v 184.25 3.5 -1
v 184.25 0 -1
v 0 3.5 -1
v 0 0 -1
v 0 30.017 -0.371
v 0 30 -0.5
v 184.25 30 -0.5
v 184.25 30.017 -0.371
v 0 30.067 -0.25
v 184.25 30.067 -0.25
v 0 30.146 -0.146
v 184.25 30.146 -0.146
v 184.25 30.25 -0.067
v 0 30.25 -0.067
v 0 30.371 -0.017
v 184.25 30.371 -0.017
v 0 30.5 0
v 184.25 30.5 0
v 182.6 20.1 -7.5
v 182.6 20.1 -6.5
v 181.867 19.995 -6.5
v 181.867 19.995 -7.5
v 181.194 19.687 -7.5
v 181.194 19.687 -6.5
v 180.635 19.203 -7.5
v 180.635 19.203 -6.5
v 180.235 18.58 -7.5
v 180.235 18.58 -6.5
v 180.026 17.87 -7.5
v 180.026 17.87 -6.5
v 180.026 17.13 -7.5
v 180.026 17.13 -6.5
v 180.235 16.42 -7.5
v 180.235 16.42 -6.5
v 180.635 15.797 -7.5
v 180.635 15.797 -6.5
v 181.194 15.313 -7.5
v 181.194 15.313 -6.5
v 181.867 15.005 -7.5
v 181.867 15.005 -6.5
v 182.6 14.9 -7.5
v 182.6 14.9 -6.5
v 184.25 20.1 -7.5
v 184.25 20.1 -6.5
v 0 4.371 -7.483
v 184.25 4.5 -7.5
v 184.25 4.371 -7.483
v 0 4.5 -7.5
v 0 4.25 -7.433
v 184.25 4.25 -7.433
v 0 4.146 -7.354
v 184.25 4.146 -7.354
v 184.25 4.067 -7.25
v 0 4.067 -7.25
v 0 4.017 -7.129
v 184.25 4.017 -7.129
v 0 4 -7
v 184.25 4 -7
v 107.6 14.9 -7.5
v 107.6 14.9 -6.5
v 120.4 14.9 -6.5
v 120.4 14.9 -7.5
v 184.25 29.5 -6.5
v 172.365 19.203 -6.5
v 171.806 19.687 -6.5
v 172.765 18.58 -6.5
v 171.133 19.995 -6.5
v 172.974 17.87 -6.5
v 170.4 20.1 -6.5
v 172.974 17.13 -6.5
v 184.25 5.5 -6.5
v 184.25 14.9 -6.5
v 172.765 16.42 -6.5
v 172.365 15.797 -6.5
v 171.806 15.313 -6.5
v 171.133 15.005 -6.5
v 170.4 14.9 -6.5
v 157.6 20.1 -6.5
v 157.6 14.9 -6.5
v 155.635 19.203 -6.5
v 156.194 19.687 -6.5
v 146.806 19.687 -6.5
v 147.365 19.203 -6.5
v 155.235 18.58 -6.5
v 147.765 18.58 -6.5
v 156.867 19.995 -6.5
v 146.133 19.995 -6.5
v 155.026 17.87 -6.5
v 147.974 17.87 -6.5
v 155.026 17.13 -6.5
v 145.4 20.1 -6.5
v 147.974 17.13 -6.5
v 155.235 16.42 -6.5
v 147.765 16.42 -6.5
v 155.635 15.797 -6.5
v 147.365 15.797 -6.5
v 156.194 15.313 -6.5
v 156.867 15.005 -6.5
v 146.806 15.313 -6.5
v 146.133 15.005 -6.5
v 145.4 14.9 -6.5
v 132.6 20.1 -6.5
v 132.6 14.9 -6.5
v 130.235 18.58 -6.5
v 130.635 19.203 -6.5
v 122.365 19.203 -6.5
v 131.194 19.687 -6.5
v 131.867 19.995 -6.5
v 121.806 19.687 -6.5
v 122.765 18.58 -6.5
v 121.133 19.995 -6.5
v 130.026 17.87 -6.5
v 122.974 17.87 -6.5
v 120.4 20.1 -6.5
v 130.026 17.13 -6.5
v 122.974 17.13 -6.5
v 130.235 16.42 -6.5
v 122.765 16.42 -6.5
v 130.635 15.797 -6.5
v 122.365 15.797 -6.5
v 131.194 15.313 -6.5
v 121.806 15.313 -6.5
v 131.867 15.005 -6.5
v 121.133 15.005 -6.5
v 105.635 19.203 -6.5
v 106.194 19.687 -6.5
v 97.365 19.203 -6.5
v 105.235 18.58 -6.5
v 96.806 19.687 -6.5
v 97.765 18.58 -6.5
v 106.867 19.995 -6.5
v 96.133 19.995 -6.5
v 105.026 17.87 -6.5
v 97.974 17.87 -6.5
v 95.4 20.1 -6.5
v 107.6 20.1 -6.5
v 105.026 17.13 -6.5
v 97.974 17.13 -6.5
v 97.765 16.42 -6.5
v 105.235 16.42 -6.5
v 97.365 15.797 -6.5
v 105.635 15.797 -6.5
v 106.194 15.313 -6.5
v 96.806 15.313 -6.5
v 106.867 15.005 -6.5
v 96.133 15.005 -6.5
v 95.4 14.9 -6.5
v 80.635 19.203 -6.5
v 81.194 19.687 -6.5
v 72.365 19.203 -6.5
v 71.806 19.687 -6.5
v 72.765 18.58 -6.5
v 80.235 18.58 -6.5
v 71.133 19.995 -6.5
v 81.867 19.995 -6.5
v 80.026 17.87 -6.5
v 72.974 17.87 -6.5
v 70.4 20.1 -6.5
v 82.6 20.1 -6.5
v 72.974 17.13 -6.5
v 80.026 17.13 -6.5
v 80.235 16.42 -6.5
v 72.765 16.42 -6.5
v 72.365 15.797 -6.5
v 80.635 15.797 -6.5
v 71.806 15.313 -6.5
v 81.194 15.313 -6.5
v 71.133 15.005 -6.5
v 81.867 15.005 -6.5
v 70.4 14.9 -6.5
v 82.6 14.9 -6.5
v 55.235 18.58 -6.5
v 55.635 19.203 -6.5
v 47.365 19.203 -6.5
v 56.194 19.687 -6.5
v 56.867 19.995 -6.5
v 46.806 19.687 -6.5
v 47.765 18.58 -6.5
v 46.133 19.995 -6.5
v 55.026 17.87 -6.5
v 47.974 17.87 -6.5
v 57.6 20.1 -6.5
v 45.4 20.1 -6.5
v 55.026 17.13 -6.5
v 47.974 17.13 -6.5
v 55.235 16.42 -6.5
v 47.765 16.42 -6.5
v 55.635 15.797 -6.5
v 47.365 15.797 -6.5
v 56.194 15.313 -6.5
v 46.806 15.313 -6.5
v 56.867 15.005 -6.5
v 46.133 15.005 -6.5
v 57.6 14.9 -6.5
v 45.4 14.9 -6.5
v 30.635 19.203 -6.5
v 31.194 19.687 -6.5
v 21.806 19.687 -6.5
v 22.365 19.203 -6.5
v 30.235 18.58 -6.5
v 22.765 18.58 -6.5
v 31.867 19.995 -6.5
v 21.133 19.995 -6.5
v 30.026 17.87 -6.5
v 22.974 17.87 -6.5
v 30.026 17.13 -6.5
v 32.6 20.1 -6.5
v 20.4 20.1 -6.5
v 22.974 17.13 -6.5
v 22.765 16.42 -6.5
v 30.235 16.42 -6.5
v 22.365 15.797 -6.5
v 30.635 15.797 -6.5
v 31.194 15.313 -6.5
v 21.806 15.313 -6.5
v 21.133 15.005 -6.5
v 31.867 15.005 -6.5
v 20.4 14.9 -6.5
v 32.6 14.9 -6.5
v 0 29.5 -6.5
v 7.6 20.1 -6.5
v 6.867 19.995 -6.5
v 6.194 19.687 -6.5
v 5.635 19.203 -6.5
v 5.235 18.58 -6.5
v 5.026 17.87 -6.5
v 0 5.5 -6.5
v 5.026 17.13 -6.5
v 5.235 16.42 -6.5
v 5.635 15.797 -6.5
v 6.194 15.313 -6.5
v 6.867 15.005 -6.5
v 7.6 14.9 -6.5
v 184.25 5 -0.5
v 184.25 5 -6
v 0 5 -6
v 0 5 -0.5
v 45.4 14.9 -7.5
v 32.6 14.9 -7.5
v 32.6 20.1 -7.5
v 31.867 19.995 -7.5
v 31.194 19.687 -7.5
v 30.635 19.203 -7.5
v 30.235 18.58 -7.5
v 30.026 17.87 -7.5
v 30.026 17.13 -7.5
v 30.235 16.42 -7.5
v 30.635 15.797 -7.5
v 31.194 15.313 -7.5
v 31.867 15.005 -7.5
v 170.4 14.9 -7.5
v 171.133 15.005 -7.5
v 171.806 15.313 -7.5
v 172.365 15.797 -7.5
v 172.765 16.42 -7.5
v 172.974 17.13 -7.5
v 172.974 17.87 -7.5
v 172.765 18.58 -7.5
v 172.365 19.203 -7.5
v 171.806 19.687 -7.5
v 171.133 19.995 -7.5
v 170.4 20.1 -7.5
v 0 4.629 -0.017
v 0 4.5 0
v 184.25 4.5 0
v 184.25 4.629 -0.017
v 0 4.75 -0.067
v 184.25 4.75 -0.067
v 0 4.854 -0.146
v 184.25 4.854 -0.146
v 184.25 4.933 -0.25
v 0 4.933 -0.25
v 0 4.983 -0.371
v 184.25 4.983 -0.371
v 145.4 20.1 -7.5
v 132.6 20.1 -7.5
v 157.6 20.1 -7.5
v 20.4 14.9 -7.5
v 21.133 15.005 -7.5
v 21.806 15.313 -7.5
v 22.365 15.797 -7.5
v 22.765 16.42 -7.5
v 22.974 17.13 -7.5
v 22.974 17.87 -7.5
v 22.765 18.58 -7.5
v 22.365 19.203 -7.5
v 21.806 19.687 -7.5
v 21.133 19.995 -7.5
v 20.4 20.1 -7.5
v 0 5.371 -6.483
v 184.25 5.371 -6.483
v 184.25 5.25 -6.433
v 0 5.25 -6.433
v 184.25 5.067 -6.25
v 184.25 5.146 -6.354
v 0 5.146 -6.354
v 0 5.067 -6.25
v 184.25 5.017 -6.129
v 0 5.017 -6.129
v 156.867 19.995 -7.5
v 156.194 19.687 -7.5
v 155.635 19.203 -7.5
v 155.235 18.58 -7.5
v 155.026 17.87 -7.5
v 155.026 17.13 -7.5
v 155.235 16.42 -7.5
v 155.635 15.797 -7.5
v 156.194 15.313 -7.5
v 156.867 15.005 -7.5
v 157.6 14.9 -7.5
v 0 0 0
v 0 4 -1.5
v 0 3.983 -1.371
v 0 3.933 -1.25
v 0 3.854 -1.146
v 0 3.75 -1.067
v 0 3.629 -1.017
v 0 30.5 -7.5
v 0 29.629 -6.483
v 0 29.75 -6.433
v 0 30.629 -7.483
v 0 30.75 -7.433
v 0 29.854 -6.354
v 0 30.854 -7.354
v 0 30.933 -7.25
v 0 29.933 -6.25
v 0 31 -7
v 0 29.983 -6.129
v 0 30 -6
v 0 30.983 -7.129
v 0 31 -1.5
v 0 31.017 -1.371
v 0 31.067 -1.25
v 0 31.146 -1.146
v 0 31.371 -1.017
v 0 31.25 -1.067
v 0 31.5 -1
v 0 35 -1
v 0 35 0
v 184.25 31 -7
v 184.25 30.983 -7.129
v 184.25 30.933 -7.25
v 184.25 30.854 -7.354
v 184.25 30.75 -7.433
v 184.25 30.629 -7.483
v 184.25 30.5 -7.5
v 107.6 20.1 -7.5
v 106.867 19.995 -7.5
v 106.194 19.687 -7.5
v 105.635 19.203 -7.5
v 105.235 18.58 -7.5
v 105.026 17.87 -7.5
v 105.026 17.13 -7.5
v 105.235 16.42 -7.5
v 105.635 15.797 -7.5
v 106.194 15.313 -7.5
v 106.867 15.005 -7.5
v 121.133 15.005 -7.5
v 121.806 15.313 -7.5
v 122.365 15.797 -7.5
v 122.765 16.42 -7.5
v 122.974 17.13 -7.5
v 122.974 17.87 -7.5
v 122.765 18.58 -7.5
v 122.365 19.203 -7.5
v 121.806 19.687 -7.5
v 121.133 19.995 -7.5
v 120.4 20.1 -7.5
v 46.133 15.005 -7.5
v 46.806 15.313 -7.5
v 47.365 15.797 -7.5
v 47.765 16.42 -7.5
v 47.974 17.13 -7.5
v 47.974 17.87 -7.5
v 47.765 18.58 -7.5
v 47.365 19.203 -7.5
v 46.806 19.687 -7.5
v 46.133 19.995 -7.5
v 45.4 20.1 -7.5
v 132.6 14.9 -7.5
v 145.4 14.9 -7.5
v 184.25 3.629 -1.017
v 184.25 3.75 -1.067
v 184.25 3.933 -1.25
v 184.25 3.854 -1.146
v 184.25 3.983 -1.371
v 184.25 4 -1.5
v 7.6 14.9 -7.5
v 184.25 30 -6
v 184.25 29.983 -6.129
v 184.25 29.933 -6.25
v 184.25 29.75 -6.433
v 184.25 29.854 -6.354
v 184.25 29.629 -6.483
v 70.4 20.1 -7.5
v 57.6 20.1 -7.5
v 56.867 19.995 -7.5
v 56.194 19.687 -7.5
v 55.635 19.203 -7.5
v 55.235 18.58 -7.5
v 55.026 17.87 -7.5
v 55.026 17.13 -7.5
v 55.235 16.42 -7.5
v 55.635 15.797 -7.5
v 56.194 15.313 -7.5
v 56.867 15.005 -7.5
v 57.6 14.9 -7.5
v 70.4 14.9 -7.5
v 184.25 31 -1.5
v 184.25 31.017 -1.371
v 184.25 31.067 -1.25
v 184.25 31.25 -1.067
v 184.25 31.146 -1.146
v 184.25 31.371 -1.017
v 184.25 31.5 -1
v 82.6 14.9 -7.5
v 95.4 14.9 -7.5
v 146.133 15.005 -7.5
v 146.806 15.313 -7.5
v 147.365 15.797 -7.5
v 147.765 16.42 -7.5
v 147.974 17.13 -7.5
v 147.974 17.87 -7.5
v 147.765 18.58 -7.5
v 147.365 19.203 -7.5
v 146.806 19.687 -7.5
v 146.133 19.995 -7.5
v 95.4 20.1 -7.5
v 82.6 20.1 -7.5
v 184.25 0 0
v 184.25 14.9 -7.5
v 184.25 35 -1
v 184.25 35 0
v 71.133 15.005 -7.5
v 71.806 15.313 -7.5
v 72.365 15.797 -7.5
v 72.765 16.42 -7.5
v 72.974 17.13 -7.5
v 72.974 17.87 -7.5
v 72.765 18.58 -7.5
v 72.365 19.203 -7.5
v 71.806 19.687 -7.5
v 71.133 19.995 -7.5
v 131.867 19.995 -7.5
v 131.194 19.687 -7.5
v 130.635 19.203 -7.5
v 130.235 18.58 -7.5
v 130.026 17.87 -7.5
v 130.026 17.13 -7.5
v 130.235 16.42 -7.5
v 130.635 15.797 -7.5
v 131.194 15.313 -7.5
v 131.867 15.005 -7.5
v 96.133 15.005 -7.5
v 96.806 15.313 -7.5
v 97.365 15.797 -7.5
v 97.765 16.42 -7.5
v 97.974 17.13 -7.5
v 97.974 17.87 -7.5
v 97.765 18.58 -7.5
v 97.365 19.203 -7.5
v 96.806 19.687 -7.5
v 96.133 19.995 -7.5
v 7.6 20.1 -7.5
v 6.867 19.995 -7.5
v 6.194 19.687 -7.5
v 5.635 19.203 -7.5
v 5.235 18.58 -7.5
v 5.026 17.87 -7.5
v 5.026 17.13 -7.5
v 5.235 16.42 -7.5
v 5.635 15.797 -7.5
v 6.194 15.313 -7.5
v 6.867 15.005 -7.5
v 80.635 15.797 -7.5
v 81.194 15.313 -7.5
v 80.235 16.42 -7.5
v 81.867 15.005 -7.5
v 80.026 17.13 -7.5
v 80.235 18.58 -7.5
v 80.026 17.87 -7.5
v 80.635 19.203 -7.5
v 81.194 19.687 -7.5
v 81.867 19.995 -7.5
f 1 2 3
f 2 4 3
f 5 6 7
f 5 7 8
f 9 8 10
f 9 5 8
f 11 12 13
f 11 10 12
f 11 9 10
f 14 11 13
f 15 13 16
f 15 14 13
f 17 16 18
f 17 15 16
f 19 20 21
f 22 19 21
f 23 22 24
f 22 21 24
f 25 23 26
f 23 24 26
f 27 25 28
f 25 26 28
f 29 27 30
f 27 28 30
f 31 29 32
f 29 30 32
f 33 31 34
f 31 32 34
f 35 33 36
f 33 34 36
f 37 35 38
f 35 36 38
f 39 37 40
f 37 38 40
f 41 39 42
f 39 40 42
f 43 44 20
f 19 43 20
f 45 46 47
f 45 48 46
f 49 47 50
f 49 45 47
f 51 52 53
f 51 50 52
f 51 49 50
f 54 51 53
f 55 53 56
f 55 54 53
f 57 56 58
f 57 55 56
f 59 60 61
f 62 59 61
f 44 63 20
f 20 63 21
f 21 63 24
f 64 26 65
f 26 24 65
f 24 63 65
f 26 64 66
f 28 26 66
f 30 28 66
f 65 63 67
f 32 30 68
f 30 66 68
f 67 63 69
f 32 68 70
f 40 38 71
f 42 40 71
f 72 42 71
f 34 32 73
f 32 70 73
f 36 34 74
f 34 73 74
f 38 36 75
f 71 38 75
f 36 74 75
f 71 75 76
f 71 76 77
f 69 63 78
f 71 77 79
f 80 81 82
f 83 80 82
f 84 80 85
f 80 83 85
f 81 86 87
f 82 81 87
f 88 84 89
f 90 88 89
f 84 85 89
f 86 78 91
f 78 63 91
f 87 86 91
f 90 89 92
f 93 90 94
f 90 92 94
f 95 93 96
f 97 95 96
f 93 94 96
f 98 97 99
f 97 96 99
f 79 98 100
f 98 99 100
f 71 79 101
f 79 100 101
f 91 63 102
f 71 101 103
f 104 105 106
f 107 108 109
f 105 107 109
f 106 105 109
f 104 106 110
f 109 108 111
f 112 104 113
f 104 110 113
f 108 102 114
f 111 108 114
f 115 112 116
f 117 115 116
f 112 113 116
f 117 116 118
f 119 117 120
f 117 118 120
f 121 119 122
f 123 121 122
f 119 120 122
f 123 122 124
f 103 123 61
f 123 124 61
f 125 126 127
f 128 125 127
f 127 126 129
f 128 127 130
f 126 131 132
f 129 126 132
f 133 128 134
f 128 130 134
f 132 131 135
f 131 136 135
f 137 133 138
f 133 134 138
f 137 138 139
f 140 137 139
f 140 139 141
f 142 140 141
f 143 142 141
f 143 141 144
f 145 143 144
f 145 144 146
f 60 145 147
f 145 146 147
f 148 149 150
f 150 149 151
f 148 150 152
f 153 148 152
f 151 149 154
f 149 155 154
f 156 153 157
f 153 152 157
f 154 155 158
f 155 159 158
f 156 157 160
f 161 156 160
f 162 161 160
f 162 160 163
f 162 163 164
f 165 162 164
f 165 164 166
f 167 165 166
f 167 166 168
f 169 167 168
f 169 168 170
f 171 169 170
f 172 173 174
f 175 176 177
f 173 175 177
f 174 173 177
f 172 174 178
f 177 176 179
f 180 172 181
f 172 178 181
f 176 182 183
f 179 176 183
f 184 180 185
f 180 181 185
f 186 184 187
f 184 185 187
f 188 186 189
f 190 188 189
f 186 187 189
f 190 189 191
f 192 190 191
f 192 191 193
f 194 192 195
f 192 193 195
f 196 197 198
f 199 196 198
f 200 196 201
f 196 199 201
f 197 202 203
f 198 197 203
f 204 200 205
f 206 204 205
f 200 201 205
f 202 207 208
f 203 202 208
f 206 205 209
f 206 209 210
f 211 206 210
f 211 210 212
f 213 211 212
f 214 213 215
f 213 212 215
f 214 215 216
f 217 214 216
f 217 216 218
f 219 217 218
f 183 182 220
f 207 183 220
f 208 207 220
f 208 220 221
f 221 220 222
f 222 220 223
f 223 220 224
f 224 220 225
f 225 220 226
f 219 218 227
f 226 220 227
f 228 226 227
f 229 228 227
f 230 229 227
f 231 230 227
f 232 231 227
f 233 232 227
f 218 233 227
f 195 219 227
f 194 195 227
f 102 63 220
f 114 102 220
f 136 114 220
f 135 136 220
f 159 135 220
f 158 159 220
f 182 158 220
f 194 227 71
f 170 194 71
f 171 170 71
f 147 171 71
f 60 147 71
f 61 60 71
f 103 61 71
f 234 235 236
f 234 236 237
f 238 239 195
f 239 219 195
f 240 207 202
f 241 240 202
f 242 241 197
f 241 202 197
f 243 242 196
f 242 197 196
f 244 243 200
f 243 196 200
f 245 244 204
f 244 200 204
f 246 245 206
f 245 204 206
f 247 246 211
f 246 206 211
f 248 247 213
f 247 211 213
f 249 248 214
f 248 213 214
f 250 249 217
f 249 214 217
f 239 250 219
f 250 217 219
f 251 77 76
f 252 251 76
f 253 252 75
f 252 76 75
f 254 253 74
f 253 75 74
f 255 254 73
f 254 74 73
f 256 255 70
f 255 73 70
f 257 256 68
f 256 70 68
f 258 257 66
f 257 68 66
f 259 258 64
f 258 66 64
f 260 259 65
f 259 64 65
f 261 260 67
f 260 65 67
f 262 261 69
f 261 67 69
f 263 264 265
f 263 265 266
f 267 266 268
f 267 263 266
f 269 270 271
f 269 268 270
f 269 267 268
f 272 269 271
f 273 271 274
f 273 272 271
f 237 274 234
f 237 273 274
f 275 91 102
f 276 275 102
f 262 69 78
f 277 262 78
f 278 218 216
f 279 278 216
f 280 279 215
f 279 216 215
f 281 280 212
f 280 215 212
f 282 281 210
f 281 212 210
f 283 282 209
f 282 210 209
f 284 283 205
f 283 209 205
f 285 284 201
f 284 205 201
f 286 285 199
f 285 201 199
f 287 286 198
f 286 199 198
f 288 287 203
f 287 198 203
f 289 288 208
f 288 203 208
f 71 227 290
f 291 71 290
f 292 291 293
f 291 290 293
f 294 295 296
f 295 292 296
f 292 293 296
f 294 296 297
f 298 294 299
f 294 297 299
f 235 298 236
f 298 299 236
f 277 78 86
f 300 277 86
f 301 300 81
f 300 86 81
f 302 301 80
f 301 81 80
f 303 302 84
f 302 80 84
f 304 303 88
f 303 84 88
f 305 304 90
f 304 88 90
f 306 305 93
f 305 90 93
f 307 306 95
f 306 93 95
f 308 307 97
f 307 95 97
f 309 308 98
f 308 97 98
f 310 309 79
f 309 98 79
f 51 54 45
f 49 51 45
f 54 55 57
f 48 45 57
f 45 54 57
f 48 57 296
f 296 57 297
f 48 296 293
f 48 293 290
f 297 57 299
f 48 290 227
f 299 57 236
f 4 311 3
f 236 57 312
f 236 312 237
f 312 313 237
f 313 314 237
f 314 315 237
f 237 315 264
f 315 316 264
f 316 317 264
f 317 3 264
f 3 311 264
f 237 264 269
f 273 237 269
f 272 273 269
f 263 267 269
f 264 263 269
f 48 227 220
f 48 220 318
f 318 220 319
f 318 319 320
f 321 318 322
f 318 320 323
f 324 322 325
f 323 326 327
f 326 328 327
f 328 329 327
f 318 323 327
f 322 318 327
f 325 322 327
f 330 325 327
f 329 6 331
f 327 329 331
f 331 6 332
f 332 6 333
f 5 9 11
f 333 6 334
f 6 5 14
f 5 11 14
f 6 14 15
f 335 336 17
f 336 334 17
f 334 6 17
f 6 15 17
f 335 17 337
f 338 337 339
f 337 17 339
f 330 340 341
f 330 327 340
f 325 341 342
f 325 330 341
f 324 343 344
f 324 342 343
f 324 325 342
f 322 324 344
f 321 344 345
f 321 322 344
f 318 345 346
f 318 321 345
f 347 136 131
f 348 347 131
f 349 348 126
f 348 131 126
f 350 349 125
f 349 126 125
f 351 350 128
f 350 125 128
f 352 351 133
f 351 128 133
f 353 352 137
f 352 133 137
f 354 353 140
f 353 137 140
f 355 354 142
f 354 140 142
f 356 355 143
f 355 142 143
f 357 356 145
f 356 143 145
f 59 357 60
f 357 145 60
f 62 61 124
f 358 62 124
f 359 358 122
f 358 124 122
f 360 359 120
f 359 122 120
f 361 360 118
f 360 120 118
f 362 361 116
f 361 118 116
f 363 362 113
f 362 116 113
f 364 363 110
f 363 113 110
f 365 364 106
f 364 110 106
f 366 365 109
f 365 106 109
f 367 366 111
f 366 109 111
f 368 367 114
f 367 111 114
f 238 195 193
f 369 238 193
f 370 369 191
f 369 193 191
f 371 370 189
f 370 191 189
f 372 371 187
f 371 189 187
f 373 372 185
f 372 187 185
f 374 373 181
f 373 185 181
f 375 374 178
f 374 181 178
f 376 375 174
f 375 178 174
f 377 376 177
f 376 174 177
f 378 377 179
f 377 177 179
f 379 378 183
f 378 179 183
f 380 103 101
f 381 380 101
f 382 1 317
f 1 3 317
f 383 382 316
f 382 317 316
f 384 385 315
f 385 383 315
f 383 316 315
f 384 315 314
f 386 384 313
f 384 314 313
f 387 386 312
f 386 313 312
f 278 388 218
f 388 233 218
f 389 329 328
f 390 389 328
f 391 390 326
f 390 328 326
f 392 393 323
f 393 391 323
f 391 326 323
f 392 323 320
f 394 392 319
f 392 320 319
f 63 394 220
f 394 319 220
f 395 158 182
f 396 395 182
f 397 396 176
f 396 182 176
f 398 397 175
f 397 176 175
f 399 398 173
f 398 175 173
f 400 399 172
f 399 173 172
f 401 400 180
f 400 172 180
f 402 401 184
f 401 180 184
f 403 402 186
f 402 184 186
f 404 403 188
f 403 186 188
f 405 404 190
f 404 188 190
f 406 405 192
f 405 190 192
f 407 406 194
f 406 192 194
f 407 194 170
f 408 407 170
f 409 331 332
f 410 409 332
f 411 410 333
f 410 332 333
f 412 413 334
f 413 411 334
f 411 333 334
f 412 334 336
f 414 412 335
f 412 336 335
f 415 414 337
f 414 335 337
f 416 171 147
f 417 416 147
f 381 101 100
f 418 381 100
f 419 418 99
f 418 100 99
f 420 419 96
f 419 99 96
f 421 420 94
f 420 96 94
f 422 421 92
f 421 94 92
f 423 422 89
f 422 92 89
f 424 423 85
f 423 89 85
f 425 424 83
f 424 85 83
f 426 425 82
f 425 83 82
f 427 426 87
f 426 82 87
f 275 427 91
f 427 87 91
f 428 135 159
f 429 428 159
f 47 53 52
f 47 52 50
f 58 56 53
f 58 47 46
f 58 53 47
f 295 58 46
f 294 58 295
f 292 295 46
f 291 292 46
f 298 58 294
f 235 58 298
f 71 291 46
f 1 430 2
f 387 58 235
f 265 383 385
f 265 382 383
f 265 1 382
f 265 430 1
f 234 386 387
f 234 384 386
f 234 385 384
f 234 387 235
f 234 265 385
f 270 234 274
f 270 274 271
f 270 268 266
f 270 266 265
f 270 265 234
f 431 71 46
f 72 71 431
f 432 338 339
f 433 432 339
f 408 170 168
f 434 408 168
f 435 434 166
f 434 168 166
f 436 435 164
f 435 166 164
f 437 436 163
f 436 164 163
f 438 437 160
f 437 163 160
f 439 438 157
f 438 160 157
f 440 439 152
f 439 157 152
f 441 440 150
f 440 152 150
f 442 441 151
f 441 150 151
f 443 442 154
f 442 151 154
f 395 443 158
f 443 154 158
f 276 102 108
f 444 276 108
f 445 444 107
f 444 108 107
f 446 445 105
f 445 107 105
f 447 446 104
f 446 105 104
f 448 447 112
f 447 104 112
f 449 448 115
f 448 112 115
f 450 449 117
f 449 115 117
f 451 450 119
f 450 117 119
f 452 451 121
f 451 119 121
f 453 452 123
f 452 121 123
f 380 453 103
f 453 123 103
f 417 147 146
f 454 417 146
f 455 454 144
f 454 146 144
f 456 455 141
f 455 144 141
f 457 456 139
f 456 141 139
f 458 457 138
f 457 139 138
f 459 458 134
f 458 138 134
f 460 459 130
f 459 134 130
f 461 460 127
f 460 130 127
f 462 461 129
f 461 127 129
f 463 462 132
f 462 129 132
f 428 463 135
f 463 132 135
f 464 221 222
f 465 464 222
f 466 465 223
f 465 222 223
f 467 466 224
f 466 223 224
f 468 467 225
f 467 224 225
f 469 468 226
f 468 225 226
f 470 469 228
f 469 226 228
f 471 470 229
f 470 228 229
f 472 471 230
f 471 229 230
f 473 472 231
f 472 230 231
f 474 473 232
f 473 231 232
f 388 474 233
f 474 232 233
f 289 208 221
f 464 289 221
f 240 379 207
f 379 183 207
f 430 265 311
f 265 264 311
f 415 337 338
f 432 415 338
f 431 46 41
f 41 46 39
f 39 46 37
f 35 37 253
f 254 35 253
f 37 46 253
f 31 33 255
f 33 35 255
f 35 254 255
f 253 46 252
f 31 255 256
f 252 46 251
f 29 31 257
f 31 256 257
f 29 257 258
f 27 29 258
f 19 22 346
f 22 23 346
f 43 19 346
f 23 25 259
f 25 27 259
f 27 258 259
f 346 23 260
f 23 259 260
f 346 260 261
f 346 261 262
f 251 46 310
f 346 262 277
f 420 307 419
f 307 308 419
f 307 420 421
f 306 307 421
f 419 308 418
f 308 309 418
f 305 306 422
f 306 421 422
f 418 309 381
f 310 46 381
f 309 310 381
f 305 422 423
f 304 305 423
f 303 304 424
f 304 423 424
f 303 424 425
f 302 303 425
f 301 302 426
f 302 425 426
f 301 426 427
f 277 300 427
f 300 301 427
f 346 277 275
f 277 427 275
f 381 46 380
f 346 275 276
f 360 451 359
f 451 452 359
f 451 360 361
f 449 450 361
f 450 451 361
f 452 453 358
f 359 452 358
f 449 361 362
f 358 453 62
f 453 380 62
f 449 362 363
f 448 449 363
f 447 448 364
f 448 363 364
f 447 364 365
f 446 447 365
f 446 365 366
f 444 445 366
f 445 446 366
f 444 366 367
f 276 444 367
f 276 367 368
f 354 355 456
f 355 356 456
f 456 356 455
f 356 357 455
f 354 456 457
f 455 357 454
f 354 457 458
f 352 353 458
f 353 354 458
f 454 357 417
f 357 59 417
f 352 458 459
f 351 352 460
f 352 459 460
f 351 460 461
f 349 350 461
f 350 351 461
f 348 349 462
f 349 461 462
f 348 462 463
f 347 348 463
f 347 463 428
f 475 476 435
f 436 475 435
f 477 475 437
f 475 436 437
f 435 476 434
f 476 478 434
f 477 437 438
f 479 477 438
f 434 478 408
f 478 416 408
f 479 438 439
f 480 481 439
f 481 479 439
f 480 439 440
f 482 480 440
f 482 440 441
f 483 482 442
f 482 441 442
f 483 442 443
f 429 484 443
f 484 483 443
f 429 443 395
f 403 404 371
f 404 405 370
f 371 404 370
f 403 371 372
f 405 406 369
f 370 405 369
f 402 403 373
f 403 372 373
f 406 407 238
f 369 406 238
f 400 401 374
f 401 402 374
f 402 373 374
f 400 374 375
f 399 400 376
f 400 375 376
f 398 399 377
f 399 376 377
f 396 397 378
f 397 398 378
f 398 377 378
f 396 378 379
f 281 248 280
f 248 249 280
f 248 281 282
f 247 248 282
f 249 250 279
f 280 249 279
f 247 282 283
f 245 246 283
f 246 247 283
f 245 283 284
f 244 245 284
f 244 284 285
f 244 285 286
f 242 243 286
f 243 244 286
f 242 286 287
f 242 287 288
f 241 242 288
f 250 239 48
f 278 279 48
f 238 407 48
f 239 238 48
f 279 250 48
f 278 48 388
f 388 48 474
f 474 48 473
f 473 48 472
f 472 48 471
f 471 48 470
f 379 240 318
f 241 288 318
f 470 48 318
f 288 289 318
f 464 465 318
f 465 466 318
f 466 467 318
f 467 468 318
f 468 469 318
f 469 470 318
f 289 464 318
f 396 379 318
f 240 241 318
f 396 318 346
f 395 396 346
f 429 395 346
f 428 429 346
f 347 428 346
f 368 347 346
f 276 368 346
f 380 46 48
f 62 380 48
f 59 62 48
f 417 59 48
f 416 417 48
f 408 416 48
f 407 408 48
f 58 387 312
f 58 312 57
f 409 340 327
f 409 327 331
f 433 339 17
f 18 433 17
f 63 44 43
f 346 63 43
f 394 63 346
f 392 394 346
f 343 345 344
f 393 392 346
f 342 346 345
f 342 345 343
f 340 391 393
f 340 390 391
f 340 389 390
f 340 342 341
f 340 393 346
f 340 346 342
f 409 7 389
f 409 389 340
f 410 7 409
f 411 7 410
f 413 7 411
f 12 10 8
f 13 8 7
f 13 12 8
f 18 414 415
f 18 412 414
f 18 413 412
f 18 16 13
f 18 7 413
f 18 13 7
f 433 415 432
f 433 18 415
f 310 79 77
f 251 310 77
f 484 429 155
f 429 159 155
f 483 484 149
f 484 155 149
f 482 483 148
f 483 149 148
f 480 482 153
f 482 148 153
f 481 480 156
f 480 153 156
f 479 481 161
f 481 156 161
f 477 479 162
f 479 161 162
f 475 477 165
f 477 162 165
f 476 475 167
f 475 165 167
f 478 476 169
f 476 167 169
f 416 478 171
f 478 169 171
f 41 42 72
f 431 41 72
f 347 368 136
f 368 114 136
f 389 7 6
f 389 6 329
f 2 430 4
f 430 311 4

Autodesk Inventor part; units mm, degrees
ref_plane "YZ Plane" through (0, 0, 0) normal (1, 0, 0) x (0, 1, 0)
ref_plane "XZ Plane" through (0, 0, 0) normal (0, 1, 0) x (-1, 0, 0)
ref_plane "XY Plane" through (0, 0, 0) normal (0, 0, 1) x (1, 0, 0)
sketch "Boceto principal" plane through (0, 0, 0) normal (1, 0, 0) x (0, 1, 0)
  line L0 (0, 0) -> (0, -1)
  line L1 (0, -1) -> (3.5, -1)
  line L2 (4, -1.5) -> (4, -7)
  line L3 (4.5, -7.5) -> (30.5, -7.5)
  line L4 (31, -7) -> (31, -1.5)
  line L5 (31.5, -1) -> (35, -1)
  line L6 (35, -1) -> (35, 0)
  line L7 (35, 0) -> (30.5, 0)
  line L8 (30, -0.5) -> (30, -6)
  line L9 (29.5, -6.5) -> (5.5, -6.5)
  line L10 (5, -6) -> (5, -0.5)
  line L11 (4.5, 0) -> (0, 0)
  arc A0 (4, -1.5) -> (3.5, -1) centre (3.5, -1.5) ccw
  arc A1 (4, -7) -> (4.5, -7.5) centre (4.5, -7) ccw
  arc A2 (30.5, -7.5) -> (31, -7) centre (30.5, -7) ccw
  arc A3 (31.5, -1) -> (31, -1.5) centre (31.5, -1.5) ccw
  arc A4 (30.5, 0) -> (30, -0.5) centre (30.5, -0.5) ccw
  arc A5 (29.5, -6.5) -> (30, -6) centre (29.5, -6) ccw
  arc A6 (5, -6) -> (5.5, -6.5) centre (5.5, -6) ccw
  arc A7 (5, -0.5) -> (4.5, 0) centre (4.5, -0.5) ccw
extrude "Extrusion1" add sketch "Boceto principal" along normal blind 184.25
sketch "Boceto agujeros" plane through (0, 0, 0) normal (0, 0, 1) x (1, 0, 0)
  line L0 (7.6, 14.9) -> (20.4, 14.9)
  line L1 (20.4, 20.1) -> (7.6, 20.1)
  arc A0 (7.6, 20.1) -> (7.6, 14.9) centre (7.6, 17.5) ccw
  arc A1 (20.4, 14.9) -> (20.4, 20.1) centre (20.4, 17.5) ccw
extrude "Extrusion2" cut sketch "Boceto agujeros" against normal blind 15
pattern_linear "Rectangular Pattern1" count 8 spacing 25 along (1, 0, 0) of "Extrusion2"
properties part number "Riel120mm"
